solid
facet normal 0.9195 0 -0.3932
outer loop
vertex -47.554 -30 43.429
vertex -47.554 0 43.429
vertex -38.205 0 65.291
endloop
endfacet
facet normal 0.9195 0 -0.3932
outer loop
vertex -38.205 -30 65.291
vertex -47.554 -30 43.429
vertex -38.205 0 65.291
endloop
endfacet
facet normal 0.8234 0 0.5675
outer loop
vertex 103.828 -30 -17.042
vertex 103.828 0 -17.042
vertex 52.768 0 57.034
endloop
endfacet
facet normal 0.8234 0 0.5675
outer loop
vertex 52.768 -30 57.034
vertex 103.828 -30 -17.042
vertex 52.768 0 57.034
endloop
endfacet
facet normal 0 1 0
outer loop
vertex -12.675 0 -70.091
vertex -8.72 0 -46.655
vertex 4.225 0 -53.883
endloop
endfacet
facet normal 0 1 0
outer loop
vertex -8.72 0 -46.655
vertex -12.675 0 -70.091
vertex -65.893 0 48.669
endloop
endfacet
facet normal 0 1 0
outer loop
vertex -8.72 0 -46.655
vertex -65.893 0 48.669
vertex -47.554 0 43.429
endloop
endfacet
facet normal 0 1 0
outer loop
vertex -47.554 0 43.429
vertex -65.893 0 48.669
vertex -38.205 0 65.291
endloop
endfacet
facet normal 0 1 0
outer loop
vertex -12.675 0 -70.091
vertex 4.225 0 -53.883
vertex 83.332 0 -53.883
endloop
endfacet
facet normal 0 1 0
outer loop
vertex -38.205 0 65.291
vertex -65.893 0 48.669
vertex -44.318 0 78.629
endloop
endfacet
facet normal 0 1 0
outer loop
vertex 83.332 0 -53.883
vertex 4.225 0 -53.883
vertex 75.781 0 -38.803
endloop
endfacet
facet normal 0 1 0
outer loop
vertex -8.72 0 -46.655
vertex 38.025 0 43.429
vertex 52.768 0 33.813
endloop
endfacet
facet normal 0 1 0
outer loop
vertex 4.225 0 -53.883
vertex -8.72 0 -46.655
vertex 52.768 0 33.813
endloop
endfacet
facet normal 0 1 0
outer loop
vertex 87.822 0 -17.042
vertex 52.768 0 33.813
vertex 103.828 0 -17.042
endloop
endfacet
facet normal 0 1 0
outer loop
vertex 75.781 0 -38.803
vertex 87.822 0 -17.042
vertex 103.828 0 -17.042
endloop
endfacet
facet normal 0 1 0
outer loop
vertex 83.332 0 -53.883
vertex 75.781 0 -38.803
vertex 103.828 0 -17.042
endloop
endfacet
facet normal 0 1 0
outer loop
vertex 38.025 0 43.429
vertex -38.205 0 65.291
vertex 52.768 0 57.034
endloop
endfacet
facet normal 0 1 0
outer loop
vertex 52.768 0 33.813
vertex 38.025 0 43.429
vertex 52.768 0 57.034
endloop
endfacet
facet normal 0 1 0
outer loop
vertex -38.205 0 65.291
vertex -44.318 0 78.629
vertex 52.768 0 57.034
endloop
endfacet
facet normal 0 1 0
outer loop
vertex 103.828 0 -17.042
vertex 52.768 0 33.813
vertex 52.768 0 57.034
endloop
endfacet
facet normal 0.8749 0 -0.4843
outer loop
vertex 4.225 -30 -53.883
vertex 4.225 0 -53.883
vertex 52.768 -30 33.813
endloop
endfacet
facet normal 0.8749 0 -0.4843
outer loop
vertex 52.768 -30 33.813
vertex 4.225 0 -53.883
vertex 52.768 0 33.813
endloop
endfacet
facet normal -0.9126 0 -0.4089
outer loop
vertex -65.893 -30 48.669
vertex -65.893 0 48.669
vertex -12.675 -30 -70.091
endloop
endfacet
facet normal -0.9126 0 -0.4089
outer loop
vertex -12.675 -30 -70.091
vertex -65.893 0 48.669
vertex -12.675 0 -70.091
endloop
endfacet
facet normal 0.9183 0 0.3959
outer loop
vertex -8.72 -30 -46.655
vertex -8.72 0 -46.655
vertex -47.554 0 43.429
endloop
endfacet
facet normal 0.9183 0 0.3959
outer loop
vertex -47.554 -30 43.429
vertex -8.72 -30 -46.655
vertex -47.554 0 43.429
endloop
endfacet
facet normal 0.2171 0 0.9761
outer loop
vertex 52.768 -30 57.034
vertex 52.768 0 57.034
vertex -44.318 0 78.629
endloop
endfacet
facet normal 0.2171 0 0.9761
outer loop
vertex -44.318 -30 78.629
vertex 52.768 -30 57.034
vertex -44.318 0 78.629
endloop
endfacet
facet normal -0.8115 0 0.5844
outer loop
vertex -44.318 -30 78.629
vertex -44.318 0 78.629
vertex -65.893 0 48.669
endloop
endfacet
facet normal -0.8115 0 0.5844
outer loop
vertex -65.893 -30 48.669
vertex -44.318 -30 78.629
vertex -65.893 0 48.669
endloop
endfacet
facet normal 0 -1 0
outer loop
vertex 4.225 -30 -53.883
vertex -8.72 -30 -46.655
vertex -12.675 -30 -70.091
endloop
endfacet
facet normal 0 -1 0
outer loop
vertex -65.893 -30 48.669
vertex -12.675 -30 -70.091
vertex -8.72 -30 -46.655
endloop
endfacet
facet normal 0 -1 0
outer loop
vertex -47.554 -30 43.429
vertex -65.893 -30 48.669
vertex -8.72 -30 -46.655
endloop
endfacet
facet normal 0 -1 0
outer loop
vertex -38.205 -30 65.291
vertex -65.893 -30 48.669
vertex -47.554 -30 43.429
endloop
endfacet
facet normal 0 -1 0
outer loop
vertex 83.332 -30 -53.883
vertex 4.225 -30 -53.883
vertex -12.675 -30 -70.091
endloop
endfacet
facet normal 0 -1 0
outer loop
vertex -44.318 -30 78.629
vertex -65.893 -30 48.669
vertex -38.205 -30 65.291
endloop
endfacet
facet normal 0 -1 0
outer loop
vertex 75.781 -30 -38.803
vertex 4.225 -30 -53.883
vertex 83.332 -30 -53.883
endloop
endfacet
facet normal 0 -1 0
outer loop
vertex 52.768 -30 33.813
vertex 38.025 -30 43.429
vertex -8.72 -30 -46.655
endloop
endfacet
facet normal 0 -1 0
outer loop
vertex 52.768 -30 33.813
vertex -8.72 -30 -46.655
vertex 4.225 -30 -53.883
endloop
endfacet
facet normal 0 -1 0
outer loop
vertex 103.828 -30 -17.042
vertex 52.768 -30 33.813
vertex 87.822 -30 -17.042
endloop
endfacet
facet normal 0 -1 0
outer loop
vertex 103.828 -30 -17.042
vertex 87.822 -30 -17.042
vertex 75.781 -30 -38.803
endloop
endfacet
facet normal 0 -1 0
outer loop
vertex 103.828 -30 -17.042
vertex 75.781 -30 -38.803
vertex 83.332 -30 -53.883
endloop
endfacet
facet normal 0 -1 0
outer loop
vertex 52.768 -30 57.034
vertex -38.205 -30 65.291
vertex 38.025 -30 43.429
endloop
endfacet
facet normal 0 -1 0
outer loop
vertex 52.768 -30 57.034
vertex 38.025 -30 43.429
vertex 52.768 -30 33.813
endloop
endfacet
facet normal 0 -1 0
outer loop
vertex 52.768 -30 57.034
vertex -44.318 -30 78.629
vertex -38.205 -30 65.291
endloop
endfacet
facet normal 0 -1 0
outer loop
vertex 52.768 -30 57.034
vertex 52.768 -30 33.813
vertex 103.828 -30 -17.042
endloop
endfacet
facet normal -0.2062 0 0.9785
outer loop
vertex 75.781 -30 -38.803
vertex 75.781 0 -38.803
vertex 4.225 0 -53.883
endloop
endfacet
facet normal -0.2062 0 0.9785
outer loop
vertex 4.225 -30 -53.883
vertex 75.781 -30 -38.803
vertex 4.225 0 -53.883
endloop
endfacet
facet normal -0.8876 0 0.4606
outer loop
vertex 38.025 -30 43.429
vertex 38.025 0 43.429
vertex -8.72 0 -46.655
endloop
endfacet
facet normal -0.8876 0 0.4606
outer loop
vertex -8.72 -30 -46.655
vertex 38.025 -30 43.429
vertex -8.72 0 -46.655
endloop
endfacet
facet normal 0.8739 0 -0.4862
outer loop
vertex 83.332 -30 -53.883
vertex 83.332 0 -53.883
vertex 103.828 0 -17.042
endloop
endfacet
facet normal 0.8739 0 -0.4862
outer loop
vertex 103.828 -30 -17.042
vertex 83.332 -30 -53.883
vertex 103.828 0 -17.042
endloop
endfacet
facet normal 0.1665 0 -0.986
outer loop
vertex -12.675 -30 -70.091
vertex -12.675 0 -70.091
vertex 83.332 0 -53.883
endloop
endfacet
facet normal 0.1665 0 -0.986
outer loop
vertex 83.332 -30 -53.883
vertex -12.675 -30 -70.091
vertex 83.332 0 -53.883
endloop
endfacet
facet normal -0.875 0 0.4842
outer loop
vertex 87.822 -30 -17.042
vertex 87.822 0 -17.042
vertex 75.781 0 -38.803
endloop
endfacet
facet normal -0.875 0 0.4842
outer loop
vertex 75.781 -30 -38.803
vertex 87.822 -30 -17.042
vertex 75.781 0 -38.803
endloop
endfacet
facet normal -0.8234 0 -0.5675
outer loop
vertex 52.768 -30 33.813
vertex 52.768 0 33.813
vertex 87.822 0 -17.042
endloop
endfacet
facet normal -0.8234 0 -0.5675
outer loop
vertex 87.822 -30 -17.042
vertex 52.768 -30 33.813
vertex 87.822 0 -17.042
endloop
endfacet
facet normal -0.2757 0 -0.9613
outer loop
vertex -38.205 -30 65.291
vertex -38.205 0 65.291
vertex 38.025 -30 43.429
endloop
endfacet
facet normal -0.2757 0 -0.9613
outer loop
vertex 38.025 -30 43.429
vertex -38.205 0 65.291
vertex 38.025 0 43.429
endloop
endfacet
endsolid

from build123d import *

# Parameters (mm, degrees)
F1_DEPTH = 30


with BuildPart() as f1:
    # F0 (on Front) → F1 (new body)
    with BuildSketch(Plane.XZ):
        Polygon((52.768022, 57.033721), (-44.317942, 78.629129), (-65.8926, 48.668932), (-12.675109, -70.090957), (83.332121, -53.882539), (103.828043, -17.042199), align=None)
        Polygon((4.225037, -53.882539), (52.768022, 33.813149), (87.822262, -17.042199), (75.780988, -38.802642), align=None, mode=Mode.SUBTRACT)
        Polygon((-47.554146, 43.428849), (-38.205128, 65.291479), (38.025331, 43.428849), (-8.719755, -46.655327), align=None, mode=Mode.SUBTRACT)
    extrude(amount=F1_DEPTH)


solid = f1.part
